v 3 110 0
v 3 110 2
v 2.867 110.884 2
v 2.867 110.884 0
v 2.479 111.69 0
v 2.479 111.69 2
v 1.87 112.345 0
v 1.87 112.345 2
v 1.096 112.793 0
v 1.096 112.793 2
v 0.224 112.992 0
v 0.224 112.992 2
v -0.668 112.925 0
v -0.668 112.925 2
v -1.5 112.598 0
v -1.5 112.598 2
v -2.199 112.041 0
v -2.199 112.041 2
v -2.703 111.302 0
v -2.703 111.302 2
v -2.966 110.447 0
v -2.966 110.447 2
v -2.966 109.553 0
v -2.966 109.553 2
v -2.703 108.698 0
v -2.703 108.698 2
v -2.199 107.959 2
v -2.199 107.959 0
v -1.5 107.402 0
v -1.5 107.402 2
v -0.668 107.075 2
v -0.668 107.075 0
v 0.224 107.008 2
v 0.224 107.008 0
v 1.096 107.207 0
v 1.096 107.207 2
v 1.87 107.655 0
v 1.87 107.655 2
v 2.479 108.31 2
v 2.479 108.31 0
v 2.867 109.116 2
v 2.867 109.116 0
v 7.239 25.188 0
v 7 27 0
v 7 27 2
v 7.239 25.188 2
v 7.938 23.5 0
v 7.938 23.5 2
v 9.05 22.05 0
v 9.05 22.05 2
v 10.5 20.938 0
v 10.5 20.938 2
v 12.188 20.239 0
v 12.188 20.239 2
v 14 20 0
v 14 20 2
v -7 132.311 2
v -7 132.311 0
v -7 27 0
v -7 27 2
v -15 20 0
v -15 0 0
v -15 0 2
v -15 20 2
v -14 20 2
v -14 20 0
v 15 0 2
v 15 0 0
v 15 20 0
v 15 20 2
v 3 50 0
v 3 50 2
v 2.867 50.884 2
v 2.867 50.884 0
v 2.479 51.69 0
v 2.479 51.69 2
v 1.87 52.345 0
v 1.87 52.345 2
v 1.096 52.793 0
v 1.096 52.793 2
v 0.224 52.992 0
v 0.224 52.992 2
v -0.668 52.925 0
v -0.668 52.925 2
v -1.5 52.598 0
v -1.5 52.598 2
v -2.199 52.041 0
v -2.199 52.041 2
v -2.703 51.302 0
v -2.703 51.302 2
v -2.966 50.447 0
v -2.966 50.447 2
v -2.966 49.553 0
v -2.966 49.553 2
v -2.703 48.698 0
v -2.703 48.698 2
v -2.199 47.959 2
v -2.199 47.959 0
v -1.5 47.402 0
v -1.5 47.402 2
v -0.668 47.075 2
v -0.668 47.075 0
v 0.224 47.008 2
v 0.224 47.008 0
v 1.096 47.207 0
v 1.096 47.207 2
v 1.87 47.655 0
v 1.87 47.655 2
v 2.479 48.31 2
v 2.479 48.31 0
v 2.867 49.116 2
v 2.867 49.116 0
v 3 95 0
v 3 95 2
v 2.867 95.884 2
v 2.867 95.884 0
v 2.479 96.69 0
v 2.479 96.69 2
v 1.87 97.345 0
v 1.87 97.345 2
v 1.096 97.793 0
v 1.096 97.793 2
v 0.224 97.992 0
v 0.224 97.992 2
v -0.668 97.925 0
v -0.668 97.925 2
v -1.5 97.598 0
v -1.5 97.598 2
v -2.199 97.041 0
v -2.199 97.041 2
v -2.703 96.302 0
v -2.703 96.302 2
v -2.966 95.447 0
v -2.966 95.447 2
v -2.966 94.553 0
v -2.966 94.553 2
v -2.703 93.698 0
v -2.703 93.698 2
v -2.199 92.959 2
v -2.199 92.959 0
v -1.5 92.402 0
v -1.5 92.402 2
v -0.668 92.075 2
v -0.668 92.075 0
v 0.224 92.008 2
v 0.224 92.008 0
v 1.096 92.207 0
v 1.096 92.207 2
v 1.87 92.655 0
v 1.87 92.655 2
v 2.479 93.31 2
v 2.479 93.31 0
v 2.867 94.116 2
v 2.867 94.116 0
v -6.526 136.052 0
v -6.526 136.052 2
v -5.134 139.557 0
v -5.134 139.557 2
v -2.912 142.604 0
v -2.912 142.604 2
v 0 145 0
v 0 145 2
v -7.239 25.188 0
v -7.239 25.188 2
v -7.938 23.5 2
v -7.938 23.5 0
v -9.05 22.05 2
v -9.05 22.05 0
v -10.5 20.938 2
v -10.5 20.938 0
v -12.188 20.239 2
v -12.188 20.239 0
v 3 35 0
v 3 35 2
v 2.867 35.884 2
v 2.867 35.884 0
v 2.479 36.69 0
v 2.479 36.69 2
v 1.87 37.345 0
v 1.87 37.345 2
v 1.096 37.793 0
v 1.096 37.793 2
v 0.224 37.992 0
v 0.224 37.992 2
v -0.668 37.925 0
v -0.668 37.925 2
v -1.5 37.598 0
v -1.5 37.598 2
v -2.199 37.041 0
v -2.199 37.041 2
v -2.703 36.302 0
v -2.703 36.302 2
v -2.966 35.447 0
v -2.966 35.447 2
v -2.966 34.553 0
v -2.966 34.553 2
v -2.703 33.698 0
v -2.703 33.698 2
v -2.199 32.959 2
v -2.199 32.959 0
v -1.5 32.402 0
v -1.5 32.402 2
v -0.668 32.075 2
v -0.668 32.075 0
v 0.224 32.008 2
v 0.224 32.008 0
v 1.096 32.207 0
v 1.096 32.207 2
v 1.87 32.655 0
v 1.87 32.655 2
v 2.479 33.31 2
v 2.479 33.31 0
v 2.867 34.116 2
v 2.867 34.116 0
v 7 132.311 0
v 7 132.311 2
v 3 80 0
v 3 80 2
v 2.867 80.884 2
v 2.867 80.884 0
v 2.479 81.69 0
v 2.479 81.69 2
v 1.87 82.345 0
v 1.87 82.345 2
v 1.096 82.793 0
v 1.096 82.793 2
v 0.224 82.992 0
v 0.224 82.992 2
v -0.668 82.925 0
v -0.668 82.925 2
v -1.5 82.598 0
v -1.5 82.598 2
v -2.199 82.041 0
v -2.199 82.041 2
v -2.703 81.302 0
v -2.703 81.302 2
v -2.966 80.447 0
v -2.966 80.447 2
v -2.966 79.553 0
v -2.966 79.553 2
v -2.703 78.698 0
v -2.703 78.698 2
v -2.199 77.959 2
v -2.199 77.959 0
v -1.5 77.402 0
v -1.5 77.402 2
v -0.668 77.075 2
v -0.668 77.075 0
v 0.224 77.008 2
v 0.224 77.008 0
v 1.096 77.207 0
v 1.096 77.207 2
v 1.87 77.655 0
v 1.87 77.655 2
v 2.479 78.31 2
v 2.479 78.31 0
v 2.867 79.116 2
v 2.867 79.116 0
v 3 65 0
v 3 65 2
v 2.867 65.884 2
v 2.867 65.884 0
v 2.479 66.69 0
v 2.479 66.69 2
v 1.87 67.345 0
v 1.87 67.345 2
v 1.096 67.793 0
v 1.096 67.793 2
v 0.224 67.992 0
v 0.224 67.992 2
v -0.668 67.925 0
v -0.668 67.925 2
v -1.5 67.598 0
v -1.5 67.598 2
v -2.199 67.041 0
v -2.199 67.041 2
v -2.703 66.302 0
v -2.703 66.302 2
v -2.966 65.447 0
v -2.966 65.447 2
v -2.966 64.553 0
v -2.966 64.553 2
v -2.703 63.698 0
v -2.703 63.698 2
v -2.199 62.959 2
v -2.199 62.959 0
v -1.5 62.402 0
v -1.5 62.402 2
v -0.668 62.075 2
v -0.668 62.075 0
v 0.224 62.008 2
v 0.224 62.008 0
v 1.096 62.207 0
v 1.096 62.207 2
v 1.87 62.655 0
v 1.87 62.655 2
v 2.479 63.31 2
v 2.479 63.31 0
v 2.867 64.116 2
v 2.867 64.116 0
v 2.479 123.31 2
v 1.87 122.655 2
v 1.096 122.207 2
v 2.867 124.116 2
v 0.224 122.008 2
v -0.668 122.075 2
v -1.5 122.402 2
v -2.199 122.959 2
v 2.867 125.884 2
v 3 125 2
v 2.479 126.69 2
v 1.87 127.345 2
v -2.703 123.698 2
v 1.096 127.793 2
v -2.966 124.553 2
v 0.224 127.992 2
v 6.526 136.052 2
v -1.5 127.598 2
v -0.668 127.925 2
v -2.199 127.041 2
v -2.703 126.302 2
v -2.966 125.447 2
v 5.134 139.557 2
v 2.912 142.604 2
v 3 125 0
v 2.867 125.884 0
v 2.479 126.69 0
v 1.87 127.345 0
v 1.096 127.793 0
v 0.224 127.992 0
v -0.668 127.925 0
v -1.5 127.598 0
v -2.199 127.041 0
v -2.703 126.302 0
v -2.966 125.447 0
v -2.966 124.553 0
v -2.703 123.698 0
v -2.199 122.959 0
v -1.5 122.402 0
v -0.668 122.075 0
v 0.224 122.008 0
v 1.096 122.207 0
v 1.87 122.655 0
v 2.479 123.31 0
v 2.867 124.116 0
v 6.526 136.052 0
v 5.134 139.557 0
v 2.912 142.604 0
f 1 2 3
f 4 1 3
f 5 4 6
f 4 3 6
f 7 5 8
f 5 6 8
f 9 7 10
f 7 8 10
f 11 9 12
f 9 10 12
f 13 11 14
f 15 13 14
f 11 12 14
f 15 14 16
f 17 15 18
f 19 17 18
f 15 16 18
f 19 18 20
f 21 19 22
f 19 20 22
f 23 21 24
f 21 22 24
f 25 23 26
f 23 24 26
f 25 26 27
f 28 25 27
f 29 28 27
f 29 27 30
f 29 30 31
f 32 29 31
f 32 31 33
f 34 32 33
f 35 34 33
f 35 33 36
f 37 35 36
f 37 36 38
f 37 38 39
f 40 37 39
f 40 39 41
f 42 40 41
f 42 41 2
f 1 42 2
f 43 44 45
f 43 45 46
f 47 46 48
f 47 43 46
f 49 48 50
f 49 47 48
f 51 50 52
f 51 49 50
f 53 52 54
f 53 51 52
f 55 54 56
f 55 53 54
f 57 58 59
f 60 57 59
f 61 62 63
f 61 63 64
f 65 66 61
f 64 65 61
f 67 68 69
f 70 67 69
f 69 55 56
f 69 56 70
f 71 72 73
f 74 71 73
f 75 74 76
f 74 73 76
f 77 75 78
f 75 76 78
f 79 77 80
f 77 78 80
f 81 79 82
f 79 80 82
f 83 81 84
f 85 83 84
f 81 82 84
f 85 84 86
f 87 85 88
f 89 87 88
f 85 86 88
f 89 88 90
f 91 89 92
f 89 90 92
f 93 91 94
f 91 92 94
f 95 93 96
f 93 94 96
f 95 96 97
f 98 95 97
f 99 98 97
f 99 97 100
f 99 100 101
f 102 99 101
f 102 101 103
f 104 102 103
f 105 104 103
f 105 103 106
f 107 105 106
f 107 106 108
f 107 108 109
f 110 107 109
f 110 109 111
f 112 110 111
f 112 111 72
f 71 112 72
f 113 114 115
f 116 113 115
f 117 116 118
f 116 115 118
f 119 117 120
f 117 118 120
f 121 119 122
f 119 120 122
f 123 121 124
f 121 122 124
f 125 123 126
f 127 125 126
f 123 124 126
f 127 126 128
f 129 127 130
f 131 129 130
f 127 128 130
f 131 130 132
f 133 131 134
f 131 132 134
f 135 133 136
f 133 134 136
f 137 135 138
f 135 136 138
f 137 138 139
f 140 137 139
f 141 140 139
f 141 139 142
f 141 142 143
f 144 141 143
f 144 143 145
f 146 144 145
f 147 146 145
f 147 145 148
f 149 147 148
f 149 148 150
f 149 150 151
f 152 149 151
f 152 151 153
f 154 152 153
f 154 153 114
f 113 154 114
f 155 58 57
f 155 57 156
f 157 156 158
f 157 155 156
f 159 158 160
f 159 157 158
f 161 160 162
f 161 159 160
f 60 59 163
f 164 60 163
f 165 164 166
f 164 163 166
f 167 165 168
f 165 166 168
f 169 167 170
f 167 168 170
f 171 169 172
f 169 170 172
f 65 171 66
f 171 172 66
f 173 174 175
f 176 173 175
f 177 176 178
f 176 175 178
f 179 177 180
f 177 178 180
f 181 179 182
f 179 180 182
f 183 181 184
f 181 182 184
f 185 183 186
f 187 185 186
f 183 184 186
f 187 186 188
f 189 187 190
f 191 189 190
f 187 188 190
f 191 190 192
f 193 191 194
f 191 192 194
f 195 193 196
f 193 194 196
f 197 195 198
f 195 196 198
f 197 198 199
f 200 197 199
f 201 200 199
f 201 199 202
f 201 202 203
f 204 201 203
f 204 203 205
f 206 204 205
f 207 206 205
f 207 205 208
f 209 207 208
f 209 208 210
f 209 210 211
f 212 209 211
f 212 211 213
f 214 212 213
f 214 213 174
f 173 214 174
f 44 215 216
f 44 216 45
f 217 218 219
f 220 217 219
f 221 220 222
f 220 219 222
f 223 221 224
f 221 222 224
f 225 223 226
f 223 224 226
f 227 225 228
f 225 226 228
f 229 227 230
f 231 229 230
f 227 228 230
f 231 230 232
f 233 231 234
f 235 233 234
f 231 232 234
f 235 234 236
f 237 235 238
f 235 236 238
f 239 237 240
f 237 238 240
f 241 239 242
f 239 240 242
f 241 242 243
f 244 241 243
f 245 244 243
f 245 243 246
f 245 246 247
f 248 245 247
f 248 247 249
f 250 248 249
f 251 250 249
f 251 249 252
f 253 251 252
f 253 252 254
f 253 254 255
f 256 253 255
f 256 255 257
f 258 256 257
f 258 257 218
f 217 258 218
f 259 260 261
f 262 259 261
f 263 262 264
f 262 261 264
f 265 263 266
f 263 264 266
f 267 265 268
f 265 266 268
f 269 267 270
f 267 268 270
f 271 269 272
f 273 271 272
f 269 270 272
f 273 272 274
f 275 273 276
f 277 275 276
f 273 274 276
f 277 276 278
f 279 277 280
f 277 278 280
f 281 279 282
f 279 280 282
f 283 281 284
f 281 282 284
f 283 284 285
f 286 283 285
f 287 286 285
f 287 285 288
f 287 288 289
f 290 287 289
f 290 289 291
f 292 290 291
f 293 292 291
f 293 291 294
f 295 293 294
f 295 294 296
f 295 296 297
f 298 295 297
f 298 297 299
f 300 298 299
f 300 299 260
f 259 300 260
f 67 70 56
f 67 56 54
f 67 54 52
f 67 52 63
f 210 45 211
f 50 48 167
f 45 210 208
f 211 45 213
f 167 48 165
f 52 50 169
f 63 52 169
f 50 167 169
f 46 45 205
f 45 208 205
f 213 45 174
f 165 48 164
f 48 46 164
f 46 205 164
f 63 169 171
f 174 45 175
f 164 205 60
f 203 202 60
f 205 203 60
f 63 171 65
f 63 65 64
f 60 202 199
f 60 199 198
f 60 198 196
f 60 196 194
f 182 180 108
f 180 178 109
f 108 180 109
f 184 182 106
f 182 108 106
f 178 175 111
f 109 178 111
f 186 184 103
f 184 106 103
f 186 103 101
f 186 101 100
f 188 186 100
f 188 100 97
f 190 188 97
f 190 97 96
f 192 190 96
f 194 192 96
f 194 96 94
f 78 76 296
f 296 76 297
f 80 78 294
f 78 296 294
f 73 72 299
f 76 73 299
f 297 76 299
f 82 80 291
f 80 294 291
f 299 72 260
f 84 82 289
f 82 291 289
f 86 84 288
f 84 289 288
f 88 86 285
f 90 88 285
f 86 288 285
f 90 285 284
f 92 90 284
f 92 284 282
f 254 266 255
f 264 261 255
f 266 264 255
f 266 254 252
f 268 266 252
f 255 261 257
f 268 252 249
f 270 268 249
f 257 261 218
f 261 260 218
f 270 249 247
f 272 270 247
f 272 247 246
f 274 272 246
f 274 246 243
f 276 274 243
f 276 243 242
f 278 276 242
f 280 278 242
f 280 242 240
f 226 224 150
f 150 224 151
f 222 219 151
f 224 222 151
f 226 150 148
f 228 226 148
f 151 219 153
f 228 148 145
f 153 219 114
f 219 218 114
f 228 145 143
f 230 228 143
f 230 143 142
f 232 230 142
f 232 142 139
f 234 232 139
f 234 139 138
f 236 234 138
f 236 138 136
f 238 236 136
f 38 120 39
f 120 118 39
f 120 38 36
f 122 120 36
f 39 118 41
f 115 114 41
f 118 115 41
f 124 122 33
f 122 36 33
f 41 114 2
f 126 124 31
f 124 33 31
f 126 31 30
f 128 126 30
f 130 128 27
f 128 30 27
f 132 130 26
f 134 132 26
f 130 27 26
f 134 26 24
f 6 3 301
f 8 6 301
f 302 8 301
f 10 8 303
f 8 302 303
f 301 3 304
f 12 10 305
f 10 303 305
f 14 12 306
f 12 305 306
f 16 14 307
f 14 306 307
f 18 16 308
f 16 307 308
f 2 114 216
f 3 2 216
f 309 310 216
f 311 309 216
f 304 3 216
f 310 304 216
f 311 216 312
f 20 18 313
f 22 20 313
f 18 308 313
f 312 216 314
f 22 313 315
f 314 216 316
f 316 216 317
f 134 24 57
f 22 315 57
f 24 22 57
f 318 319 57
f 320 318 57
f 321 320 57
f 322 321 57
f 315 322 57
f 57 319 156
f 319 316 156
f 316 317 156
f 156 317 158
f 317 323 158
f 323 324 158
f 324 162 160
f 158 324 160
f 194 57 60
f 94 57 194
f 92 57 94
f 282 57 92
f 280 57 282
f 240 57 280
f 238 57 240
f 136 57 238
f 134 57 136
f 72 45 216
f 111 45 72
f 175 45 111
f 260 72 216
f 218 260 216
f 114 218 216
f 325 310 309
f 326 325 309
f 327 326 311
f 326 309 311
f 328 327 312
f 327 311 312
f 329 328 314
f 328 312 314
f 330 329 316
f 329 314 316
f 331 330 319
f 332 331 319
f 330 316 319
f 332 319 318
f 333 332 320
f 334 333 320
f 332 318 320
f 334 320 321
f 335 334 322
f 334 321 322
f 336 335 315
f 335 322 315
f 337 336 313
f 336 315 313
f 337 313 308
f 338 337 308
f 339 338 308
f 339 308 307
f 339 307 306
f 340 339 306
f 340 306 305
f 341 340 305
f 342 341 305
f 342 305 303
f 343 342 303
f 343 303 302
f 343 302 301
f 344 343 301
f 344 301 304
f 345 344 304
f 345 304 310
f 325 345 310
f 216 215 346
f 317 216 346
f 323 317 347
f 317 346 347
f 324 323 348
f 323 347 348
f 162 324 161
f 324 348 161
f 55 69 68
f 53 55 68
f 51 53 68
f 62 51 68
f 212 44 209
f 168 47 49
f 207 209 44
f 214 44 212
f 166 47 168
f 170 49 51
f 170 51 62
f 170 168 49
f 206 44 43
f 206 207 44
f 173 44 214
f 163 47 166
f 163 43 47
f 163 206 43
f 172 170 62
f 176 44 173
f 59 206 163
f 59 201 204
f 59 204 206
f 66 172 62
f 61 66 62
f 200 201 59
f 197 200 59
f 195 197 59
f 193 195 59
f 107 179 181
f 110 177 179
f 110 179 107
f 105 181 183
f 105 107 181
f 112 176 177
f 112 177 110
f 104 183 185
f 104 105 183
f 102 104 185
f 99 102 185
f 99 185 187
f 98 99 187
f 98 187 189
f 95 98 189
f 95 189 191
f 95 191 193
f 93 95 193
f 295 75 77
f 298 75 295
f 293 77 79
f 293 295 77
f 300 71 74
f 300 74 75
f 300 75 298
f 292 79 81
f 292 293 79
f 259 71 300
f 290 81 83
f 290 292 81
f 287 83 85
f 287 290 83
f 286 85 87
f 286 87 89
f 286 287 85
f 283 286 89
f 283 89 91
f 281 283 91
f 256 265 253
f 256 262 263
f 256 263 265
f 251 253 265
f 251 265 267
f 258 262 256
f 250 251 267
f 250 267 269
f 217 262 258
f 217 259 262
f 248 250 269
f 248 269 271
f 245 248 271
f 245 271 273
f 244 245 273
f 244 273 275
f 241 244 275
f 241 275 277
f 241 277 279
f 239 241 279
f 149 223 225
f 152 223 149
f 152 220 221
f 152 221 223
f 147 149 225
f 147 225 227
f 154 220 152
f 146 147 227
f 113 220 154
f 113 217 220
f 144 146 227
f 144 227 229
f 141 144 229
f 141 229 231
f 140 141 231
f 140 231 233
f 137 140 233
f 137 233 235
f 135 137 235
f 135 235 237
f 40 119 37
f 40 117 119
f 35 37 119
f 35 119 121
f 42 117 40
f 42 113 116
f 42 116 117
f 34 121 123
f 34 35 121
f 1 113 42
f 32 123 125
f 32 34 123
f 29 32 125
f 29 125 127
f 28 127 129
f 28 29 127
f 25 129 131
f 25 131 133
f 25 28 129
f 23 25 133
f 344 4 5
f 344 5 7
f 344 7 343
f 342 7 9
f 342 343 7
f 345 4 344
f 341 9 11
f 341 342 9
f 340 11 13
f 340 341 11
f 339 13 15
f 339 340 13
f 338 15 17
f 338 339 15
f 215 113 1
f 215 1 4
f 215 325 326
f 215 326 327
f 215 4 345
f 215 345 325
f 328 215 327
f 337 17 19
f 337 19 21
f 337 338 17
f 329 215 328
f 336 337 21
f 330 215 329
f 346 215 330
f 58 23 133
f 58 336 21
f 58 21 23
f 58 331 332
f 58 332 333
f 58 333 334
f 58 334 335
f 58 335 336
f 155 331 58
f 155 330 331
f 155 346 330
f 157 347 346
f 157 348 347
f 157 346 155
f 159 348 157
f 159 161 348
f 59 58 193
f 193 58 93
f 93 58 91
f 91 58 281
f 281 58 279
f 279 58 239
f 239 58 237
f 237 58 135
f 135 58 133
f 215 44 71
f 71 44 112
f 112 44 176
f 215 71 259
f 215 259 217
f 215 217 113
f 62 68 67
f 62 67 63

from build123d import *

# Parameters (mm, degrees)
PAD_DEPTH   = 2
SKETCH001_R = 3
HOLE_DEPTH  = 25


with BuildPart() as part:
    # Sketch → Pad (new body)
    with BuildSketch(Plane.XY):
        with BuildLine():
            Line((0, 0), (15, 0))
            Line((15, 0), (15, 20))
            Line((14, 20), (15, 20))
            ThreePointArc((7, 26.999996), (9.050254, 22.050251), (14, 20))
            Line((7, 28.739996), (7, 26.999996))
            Line((7, 132.311423), (7, 28.739996))
            ThreePointArc((7, 132.311422), (5.133926, 139.557111), (0, 145))
            Line((0, 145), (0, 0))
        make_face()
    pad = extrude(amount=PAD_DEPTH)

    # Mirrored: Pad across Sketch V_Axis
    add(pad.mirror(Plane(origin=(0, 0, 0), x_dir=(0, 0, 1), z_dir=(1, 0, 0))))

    # Sketch001 (on Face5 of Mirrored) → Hole (cut)
    with BuildSketch(Plane.XY.offset(2)):
        with Locations((0, 35)):
            Circle(SKETCH001_R)
        with Locations((0, 50)):
            Circle(SKETCH001_R)
        with Locations((0, 65)):
            Circle(SKETCH001_R)
        with Locations((0, 80)):
            Circle(SKETCH001_R)
        with Locations((0, 95)):
            Circle(SKETCH001_R)
        with Locations((0, 110)):
            Circle(SKETCH001_R)
        with Locations((0, 125)):
            Circle(SKETCH001_R)
    extrude(amount=-HOLE_DEPTH, mode=Mode.SUBTRACT)


solid = part.part
